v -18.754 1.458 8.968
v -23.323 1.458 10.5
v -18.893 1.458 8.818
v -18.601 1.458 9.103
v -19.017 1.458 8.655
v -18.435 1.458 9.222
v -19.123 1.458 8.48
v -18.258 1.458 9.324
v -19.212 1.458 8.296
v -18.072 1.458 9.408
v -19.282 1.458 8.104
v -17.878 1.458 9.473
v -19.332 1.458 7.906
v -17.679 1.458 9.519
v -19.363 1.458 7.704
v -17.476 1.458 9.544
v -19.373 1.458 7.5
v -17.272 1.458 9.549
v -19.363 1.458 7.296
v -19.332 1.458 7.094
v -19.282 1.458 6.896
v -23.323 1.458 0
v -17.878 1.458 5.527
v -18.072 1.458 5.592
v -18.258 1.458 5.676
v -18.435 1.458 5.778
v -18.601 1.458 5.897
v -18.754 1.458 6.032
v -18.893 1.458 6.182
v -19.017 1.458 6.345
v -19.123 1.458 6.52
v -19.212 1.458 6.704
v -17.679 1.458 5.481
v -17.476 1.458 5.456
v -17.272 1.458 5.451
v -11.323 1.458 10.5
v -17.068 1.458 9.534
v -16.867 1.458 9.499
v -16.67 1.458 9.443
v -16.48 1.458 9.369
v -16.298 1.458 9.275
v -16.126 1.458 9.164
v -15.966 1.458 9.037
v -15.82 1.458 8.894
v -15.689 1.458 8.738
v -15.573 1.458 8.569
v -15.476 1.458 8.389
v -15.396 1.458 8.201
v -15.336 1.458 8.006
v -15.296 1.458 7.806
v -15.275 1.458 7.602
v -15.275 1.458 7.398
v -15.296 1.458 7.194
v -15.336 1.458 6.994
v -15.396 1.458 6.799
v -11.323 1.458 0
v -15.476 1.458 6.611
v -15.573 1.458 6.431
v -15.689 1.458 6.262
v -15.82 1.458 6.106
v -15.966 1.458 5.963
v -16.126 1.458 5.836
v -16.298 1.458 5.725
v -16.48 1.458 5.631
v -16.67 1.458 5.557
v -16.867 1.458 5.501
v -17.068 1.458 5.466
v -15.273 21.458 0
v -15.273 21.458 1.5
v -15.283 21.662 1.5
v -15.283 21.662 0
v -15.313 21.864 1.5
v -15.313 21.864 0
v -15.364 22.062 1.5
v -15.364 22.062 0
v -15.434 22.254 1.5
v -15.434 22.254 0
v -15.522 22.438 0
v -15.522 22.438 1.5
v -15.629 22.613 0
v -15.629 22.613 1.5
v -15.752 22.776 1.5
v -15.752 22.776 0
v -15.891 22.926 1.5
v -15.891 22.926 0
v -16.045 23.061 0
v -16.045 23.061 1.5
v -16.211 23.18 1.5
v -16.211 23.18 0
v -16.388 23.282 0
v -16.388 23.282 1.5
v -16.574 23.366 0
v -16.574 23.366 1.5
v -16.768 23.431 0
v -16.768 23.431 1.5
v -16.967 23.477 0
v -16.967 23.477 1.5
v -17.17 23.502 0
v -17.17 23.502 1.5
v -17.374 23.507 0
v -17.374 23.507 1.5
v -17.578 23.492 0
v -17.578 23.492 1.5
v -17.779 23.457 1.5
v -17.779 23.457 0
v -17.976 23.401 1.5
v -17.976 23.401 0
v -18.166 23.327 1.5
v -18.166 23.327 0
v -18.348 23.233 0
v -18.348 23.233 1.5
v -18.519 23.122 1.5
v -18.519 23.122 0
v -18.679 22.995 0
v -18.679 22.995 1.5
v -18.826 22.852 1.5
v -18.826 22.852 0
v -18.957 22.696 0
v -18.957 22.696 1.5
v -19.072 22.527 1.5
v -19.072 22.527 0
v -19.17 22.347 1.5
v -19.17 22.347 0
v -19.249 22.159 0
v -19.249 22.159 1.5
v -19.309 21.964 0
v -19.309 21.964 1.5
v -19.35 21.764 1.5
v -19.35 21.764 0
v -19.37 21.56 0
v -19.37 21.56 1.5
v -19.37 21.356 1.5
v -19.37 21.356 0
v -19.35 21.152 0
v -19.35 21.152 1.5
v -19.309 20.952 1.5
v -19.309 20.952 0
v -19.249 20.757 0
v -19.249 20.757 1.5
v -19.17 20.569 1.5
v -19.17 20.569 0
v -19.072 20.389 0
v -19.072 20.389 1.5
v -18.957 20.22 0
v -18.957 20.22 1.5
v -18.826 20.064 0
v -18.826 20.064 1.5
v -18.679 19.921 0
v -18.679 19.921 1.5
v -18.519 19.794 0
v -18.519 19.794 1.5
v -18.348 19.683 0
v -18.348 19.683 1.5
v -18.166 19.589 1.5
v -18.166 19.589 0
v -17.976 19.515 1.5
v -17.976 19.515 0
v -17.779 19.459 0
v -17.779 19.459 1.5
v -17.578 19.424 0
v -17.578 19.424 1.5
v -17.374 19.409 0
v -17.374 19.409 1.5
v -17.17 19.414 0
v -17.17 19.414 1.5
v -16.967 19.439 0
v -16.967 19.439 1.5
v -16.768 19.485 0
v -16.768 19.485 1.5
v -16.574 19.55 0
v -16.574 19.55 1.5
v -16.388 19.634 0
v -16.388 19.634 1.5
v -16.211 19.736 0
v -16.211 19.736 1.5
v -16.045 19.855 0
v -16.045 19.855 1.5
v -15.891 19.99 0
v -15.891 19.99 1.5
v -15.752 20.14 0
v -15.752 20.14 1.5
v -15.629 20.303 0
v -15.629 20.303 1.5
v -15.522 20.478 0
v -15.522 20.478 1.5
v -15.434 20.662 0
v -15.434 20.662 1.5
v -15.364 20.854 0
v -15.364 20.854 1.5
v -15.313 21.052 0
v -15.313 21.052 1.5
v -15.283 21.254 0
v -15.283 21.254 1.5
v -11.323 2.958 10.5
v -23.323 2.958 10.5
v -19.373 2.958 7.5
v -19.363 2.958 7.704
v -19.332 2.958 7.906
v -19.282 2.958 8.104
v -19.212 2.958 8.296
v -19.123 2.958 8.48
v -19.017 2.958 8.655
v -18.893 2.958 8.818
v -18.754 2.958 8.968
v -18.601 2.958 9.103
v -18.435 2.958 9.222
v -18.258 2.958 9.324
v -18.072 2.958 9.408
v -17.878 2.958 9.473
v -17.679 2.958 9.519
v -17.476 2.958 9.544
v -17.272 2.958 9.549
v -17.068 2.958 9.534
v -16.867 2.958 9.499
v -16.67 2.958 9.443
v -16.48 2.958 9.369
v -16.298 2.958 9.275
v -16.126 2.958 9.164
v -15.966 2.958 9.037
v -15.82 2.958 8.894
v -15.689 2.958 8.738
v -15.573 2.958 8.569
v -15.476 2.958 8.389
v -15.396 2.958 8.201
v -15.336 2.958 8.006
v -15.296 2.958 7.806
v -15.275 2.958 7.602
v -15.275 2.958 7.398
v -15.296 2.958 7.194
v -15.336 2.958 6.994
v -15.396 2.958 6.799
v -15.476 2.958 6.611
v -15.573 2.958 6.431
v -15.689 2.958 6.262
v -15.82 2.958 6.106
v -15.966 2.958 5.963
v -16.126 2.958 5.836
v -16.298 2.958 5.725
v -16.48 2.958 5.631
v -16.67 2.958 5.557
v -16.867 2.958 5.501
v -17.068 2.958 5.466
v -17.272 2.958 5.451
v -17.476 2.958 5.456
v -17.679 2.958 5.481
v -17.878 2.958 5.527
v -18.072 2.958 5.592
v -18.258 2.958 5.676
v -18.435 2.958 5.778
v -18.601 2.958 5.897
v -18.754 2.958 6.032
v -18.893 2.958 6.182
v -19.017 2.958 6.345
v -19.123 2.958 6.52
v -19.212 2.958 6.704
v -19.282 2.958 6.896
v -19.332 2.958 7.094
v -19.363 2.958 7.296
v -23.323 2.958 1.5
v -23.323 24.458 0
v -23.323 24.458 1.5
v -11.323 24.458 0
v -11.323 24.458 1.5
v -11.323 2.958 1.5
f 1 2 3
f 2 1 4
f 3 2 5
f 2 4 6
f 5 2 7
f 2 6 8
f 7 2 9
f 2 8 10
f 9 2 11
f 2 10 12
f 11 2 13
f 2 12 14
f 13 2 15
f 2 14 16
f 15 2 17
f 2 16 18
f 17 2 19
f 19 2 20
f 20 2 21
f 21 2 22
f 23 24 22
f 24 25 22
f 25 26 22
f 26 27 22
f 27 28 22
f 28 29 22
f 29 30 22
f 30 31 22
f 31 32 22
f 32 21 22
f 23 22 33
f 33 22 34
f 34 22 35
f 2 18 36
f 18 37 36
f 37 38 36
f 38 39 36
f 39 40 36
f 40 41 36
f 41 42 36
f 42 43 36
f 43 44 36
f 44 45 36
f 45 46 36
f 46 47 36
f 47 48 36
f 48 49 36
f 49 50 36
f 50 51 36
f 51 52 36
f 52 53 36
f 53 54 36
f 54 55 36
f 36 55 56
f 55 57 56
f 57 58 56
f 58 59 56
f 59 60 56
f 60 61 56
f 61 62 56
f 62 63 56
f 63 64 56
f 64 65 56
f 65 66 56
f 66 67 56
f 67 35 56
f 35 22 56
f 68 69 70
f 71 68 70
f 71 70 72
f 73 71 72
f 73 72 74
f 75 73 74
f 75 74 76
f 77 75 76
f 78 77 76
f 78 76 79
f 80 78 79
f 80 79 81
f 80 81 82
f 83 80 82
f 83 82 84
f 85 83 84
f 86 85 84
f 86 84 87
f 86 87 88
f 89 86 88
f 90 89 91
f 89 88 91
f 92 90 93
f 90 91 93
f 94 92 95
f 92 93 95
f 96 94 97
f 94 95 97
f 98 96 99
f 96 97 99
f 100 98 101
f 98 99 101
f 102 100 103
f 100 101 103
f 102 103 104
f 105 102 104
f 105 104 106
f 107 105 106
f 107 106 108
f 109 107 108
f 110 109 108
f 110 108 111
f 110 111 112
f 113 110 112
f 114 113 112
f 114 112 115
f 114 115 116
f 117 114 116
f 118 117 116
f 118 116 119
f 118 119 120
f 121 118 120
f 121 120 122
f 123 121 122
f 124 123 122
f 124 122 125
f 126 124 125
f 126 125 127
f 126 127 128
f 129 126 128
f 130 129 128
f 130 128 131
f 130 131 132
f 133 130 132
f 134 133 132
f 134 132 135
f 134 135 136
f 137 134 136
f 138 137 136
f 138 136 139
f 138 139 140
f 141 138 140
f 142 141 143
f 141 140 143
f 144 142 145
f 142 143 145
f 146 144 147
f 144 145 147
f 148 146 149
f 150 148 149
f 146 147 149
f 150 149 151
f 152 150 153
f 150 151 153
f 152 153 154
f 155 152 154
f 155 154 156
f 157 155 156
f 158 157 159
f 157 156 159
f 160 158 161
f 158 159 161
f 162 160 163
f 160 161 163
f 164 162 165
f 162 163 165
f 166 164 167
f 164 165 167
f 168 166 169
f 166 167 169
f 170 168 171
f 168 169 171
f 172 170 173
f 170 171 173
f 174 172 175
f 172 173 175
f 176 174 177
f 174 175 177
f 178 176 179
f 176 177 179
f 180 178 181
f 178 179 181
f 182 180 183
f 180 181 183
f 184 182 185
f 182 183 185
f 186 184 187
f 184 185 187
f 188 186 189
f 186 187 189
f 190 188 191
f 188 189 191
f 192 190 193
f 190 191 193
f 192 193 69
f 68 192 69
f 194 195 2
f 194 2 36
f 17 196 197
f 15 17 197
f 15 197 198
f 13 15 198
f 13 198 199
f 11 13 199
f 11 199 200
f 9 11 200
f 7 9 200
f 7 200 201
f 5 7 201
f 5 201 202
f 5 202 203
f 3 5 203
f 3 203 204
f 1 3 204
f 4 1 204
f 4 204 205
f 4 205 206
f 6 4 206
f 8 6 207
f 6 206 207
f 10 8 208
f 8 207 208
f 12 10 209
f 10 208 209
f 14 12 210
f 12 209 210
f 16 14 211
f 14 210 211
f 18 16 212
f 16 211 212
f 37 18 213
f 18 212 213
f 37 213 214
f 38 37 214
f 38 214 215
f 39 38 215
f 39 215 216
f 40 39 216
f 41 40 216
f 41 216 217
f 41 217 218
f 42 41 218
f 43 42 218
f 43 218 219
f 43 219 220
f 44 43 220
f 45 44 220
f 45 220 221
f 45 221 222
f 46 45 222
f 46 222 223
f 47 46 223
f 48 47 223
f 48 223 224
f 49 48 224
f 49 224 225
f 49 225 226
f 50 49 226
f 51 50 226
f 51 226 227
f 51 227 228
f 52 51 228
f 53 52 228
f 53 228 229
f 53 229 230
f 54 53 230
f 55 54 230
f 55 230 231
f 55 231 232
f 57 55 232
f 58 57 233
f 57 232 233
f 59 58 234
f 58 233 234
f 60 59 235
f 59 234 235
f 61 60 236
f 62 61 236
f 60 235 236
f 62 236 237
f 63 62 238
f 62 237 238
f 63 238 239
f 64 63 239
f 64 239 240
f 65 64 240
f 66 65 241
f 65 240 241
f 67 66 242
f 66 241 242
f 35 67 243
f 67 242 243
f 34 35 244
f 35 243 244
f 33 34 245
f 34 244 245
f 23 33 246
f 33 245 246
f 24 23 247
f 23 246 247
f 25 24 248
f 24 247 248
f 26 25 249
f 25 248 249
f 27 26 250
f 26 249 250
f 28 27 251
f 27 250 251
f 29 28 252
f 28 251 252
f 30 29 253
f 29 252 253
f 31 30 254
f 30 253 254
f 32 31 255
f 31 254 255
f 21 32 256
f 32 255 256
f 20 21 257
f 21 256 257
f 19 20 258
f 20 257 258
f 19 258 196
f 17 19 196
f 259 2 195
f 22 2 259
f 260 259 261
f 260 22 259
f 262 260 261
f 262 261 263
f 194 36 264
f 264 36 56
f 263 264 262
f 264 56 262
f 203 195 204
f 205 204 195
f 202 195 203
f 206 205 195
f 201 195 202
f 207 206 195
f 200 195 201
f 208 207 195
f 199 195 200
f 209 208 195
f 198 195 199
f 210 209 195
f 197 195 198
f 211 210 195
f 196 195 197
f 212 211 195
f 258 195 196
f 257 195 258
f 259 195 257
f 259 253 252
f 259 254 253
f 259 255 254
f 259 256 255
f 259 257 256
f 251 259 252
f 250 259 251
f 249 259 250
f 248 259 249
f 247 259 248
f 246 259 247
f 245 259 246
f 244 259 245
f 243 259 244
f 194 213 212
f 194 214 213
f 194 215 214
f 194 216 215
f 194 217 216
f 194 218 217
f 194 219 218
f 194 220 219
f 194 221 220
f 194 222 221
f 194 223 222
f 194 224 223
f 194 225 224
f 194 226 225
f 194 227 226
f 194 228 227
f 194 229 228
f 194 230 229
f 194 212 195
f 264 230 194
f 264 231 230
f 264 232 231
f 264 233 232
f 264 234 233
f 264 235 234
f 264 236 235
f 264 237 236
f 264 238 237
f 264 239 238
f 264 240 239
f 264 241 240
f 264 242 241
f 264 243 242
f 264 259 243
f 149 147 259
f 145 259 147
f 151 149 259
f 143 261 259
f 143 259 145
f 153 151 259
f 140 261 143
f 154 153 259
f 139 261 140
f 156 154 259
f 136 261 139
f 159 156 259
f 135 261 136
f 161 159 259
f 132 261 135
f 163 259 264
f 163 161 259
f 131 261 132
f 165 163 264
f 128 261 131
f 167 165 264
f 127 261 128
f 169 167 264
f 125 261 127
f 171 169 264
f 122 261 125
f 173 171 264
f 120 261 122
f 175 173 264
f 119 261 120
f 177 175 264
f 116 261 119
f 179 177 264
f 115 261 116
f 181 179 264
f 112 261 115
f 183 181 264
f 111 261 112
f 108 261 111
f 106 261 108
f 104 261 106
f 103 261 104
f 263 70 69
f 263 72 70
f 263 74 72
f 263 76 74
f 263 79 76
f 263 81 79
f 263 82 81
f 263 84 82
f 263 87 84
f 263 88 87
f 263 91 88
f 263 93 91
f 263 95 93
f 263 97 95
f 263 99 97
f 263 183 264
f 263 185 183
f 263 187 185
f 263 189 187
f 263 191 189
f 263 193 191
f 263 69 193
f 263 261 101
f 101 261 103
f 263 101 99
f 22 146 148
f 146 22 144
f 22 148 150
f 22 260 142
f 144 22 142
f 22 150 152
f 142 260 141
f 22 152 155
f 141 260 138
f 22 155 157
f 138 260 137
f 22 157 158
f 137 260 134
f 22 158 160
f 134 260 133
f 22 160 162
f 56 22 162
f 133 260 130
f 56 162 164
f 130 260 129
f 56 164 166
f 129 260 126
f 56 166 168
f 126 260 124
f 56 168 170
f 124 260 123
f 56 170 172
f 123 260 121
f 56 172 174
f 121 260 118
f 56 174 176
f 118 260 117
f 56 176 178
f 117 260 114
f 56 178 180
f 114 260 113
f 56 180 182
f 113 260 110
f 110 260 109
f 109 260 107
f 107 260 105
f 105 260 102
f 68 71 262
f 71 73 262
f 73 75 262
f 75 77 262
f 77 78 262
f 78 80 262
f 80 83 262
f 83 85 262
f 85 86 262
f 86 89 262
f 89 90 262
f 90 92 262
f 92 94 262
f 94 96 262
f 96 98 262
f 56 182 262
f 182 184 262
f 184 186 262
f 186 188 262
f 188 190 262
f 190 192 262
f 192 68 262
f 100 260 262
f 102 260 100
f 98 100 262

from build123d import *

# Parameters (mm, degrees)
F0_W     = 12
F0_H     = 23
F1_DEPTH = 1.5
F2_R     = 2.05
F3_DEPTH = 25
F4_W     = 12
F4_H     = 1.5
F5_DEPTH = 9
F6_R     = 2.05
F7_DEPTH = 25


with BuildPart() as f1:
    # F0 (on Top) → F1 (new body)
    with BuildSketch(Plane.XY):
        with Locations((-17.322744, 12.958014)):
            Rectangle(F0_W, F0_H)
    extrude(amount=F1_DEPTH)

    # F2 (on face) → F3 (cut)
    with BuildSketch(Plane.XY.offset(1.5)):
        with Locations((-17.322744, 21.458014)):
            Circle(F2_R)
    extrude(amount=-F3_DEPTH, mode=Mode.SUBTRACT)

    # F4 (on face) → F5 (join)
    with BuildSketch(Plane.XY.offset(1.5)):
        with Locations((-17.322744, 2.208014)):
            Rectangle(F4_W, F4_H)
    extrude(amount=F5_DEPTH)

    # F6 (on face) → F7 (cut)
    with BuildSketch(Plane(origin=(0, 2.958014, 0), x_dir=(-1, 0, 0), z_dir=(0, 1, 0))):
        with Locations((17.322744, 7.5)):
            Circle(F6_R)
    extrude(amount=-F7_DEPTH, mode=Mode.SUBTRACT)


solid = f1.part
